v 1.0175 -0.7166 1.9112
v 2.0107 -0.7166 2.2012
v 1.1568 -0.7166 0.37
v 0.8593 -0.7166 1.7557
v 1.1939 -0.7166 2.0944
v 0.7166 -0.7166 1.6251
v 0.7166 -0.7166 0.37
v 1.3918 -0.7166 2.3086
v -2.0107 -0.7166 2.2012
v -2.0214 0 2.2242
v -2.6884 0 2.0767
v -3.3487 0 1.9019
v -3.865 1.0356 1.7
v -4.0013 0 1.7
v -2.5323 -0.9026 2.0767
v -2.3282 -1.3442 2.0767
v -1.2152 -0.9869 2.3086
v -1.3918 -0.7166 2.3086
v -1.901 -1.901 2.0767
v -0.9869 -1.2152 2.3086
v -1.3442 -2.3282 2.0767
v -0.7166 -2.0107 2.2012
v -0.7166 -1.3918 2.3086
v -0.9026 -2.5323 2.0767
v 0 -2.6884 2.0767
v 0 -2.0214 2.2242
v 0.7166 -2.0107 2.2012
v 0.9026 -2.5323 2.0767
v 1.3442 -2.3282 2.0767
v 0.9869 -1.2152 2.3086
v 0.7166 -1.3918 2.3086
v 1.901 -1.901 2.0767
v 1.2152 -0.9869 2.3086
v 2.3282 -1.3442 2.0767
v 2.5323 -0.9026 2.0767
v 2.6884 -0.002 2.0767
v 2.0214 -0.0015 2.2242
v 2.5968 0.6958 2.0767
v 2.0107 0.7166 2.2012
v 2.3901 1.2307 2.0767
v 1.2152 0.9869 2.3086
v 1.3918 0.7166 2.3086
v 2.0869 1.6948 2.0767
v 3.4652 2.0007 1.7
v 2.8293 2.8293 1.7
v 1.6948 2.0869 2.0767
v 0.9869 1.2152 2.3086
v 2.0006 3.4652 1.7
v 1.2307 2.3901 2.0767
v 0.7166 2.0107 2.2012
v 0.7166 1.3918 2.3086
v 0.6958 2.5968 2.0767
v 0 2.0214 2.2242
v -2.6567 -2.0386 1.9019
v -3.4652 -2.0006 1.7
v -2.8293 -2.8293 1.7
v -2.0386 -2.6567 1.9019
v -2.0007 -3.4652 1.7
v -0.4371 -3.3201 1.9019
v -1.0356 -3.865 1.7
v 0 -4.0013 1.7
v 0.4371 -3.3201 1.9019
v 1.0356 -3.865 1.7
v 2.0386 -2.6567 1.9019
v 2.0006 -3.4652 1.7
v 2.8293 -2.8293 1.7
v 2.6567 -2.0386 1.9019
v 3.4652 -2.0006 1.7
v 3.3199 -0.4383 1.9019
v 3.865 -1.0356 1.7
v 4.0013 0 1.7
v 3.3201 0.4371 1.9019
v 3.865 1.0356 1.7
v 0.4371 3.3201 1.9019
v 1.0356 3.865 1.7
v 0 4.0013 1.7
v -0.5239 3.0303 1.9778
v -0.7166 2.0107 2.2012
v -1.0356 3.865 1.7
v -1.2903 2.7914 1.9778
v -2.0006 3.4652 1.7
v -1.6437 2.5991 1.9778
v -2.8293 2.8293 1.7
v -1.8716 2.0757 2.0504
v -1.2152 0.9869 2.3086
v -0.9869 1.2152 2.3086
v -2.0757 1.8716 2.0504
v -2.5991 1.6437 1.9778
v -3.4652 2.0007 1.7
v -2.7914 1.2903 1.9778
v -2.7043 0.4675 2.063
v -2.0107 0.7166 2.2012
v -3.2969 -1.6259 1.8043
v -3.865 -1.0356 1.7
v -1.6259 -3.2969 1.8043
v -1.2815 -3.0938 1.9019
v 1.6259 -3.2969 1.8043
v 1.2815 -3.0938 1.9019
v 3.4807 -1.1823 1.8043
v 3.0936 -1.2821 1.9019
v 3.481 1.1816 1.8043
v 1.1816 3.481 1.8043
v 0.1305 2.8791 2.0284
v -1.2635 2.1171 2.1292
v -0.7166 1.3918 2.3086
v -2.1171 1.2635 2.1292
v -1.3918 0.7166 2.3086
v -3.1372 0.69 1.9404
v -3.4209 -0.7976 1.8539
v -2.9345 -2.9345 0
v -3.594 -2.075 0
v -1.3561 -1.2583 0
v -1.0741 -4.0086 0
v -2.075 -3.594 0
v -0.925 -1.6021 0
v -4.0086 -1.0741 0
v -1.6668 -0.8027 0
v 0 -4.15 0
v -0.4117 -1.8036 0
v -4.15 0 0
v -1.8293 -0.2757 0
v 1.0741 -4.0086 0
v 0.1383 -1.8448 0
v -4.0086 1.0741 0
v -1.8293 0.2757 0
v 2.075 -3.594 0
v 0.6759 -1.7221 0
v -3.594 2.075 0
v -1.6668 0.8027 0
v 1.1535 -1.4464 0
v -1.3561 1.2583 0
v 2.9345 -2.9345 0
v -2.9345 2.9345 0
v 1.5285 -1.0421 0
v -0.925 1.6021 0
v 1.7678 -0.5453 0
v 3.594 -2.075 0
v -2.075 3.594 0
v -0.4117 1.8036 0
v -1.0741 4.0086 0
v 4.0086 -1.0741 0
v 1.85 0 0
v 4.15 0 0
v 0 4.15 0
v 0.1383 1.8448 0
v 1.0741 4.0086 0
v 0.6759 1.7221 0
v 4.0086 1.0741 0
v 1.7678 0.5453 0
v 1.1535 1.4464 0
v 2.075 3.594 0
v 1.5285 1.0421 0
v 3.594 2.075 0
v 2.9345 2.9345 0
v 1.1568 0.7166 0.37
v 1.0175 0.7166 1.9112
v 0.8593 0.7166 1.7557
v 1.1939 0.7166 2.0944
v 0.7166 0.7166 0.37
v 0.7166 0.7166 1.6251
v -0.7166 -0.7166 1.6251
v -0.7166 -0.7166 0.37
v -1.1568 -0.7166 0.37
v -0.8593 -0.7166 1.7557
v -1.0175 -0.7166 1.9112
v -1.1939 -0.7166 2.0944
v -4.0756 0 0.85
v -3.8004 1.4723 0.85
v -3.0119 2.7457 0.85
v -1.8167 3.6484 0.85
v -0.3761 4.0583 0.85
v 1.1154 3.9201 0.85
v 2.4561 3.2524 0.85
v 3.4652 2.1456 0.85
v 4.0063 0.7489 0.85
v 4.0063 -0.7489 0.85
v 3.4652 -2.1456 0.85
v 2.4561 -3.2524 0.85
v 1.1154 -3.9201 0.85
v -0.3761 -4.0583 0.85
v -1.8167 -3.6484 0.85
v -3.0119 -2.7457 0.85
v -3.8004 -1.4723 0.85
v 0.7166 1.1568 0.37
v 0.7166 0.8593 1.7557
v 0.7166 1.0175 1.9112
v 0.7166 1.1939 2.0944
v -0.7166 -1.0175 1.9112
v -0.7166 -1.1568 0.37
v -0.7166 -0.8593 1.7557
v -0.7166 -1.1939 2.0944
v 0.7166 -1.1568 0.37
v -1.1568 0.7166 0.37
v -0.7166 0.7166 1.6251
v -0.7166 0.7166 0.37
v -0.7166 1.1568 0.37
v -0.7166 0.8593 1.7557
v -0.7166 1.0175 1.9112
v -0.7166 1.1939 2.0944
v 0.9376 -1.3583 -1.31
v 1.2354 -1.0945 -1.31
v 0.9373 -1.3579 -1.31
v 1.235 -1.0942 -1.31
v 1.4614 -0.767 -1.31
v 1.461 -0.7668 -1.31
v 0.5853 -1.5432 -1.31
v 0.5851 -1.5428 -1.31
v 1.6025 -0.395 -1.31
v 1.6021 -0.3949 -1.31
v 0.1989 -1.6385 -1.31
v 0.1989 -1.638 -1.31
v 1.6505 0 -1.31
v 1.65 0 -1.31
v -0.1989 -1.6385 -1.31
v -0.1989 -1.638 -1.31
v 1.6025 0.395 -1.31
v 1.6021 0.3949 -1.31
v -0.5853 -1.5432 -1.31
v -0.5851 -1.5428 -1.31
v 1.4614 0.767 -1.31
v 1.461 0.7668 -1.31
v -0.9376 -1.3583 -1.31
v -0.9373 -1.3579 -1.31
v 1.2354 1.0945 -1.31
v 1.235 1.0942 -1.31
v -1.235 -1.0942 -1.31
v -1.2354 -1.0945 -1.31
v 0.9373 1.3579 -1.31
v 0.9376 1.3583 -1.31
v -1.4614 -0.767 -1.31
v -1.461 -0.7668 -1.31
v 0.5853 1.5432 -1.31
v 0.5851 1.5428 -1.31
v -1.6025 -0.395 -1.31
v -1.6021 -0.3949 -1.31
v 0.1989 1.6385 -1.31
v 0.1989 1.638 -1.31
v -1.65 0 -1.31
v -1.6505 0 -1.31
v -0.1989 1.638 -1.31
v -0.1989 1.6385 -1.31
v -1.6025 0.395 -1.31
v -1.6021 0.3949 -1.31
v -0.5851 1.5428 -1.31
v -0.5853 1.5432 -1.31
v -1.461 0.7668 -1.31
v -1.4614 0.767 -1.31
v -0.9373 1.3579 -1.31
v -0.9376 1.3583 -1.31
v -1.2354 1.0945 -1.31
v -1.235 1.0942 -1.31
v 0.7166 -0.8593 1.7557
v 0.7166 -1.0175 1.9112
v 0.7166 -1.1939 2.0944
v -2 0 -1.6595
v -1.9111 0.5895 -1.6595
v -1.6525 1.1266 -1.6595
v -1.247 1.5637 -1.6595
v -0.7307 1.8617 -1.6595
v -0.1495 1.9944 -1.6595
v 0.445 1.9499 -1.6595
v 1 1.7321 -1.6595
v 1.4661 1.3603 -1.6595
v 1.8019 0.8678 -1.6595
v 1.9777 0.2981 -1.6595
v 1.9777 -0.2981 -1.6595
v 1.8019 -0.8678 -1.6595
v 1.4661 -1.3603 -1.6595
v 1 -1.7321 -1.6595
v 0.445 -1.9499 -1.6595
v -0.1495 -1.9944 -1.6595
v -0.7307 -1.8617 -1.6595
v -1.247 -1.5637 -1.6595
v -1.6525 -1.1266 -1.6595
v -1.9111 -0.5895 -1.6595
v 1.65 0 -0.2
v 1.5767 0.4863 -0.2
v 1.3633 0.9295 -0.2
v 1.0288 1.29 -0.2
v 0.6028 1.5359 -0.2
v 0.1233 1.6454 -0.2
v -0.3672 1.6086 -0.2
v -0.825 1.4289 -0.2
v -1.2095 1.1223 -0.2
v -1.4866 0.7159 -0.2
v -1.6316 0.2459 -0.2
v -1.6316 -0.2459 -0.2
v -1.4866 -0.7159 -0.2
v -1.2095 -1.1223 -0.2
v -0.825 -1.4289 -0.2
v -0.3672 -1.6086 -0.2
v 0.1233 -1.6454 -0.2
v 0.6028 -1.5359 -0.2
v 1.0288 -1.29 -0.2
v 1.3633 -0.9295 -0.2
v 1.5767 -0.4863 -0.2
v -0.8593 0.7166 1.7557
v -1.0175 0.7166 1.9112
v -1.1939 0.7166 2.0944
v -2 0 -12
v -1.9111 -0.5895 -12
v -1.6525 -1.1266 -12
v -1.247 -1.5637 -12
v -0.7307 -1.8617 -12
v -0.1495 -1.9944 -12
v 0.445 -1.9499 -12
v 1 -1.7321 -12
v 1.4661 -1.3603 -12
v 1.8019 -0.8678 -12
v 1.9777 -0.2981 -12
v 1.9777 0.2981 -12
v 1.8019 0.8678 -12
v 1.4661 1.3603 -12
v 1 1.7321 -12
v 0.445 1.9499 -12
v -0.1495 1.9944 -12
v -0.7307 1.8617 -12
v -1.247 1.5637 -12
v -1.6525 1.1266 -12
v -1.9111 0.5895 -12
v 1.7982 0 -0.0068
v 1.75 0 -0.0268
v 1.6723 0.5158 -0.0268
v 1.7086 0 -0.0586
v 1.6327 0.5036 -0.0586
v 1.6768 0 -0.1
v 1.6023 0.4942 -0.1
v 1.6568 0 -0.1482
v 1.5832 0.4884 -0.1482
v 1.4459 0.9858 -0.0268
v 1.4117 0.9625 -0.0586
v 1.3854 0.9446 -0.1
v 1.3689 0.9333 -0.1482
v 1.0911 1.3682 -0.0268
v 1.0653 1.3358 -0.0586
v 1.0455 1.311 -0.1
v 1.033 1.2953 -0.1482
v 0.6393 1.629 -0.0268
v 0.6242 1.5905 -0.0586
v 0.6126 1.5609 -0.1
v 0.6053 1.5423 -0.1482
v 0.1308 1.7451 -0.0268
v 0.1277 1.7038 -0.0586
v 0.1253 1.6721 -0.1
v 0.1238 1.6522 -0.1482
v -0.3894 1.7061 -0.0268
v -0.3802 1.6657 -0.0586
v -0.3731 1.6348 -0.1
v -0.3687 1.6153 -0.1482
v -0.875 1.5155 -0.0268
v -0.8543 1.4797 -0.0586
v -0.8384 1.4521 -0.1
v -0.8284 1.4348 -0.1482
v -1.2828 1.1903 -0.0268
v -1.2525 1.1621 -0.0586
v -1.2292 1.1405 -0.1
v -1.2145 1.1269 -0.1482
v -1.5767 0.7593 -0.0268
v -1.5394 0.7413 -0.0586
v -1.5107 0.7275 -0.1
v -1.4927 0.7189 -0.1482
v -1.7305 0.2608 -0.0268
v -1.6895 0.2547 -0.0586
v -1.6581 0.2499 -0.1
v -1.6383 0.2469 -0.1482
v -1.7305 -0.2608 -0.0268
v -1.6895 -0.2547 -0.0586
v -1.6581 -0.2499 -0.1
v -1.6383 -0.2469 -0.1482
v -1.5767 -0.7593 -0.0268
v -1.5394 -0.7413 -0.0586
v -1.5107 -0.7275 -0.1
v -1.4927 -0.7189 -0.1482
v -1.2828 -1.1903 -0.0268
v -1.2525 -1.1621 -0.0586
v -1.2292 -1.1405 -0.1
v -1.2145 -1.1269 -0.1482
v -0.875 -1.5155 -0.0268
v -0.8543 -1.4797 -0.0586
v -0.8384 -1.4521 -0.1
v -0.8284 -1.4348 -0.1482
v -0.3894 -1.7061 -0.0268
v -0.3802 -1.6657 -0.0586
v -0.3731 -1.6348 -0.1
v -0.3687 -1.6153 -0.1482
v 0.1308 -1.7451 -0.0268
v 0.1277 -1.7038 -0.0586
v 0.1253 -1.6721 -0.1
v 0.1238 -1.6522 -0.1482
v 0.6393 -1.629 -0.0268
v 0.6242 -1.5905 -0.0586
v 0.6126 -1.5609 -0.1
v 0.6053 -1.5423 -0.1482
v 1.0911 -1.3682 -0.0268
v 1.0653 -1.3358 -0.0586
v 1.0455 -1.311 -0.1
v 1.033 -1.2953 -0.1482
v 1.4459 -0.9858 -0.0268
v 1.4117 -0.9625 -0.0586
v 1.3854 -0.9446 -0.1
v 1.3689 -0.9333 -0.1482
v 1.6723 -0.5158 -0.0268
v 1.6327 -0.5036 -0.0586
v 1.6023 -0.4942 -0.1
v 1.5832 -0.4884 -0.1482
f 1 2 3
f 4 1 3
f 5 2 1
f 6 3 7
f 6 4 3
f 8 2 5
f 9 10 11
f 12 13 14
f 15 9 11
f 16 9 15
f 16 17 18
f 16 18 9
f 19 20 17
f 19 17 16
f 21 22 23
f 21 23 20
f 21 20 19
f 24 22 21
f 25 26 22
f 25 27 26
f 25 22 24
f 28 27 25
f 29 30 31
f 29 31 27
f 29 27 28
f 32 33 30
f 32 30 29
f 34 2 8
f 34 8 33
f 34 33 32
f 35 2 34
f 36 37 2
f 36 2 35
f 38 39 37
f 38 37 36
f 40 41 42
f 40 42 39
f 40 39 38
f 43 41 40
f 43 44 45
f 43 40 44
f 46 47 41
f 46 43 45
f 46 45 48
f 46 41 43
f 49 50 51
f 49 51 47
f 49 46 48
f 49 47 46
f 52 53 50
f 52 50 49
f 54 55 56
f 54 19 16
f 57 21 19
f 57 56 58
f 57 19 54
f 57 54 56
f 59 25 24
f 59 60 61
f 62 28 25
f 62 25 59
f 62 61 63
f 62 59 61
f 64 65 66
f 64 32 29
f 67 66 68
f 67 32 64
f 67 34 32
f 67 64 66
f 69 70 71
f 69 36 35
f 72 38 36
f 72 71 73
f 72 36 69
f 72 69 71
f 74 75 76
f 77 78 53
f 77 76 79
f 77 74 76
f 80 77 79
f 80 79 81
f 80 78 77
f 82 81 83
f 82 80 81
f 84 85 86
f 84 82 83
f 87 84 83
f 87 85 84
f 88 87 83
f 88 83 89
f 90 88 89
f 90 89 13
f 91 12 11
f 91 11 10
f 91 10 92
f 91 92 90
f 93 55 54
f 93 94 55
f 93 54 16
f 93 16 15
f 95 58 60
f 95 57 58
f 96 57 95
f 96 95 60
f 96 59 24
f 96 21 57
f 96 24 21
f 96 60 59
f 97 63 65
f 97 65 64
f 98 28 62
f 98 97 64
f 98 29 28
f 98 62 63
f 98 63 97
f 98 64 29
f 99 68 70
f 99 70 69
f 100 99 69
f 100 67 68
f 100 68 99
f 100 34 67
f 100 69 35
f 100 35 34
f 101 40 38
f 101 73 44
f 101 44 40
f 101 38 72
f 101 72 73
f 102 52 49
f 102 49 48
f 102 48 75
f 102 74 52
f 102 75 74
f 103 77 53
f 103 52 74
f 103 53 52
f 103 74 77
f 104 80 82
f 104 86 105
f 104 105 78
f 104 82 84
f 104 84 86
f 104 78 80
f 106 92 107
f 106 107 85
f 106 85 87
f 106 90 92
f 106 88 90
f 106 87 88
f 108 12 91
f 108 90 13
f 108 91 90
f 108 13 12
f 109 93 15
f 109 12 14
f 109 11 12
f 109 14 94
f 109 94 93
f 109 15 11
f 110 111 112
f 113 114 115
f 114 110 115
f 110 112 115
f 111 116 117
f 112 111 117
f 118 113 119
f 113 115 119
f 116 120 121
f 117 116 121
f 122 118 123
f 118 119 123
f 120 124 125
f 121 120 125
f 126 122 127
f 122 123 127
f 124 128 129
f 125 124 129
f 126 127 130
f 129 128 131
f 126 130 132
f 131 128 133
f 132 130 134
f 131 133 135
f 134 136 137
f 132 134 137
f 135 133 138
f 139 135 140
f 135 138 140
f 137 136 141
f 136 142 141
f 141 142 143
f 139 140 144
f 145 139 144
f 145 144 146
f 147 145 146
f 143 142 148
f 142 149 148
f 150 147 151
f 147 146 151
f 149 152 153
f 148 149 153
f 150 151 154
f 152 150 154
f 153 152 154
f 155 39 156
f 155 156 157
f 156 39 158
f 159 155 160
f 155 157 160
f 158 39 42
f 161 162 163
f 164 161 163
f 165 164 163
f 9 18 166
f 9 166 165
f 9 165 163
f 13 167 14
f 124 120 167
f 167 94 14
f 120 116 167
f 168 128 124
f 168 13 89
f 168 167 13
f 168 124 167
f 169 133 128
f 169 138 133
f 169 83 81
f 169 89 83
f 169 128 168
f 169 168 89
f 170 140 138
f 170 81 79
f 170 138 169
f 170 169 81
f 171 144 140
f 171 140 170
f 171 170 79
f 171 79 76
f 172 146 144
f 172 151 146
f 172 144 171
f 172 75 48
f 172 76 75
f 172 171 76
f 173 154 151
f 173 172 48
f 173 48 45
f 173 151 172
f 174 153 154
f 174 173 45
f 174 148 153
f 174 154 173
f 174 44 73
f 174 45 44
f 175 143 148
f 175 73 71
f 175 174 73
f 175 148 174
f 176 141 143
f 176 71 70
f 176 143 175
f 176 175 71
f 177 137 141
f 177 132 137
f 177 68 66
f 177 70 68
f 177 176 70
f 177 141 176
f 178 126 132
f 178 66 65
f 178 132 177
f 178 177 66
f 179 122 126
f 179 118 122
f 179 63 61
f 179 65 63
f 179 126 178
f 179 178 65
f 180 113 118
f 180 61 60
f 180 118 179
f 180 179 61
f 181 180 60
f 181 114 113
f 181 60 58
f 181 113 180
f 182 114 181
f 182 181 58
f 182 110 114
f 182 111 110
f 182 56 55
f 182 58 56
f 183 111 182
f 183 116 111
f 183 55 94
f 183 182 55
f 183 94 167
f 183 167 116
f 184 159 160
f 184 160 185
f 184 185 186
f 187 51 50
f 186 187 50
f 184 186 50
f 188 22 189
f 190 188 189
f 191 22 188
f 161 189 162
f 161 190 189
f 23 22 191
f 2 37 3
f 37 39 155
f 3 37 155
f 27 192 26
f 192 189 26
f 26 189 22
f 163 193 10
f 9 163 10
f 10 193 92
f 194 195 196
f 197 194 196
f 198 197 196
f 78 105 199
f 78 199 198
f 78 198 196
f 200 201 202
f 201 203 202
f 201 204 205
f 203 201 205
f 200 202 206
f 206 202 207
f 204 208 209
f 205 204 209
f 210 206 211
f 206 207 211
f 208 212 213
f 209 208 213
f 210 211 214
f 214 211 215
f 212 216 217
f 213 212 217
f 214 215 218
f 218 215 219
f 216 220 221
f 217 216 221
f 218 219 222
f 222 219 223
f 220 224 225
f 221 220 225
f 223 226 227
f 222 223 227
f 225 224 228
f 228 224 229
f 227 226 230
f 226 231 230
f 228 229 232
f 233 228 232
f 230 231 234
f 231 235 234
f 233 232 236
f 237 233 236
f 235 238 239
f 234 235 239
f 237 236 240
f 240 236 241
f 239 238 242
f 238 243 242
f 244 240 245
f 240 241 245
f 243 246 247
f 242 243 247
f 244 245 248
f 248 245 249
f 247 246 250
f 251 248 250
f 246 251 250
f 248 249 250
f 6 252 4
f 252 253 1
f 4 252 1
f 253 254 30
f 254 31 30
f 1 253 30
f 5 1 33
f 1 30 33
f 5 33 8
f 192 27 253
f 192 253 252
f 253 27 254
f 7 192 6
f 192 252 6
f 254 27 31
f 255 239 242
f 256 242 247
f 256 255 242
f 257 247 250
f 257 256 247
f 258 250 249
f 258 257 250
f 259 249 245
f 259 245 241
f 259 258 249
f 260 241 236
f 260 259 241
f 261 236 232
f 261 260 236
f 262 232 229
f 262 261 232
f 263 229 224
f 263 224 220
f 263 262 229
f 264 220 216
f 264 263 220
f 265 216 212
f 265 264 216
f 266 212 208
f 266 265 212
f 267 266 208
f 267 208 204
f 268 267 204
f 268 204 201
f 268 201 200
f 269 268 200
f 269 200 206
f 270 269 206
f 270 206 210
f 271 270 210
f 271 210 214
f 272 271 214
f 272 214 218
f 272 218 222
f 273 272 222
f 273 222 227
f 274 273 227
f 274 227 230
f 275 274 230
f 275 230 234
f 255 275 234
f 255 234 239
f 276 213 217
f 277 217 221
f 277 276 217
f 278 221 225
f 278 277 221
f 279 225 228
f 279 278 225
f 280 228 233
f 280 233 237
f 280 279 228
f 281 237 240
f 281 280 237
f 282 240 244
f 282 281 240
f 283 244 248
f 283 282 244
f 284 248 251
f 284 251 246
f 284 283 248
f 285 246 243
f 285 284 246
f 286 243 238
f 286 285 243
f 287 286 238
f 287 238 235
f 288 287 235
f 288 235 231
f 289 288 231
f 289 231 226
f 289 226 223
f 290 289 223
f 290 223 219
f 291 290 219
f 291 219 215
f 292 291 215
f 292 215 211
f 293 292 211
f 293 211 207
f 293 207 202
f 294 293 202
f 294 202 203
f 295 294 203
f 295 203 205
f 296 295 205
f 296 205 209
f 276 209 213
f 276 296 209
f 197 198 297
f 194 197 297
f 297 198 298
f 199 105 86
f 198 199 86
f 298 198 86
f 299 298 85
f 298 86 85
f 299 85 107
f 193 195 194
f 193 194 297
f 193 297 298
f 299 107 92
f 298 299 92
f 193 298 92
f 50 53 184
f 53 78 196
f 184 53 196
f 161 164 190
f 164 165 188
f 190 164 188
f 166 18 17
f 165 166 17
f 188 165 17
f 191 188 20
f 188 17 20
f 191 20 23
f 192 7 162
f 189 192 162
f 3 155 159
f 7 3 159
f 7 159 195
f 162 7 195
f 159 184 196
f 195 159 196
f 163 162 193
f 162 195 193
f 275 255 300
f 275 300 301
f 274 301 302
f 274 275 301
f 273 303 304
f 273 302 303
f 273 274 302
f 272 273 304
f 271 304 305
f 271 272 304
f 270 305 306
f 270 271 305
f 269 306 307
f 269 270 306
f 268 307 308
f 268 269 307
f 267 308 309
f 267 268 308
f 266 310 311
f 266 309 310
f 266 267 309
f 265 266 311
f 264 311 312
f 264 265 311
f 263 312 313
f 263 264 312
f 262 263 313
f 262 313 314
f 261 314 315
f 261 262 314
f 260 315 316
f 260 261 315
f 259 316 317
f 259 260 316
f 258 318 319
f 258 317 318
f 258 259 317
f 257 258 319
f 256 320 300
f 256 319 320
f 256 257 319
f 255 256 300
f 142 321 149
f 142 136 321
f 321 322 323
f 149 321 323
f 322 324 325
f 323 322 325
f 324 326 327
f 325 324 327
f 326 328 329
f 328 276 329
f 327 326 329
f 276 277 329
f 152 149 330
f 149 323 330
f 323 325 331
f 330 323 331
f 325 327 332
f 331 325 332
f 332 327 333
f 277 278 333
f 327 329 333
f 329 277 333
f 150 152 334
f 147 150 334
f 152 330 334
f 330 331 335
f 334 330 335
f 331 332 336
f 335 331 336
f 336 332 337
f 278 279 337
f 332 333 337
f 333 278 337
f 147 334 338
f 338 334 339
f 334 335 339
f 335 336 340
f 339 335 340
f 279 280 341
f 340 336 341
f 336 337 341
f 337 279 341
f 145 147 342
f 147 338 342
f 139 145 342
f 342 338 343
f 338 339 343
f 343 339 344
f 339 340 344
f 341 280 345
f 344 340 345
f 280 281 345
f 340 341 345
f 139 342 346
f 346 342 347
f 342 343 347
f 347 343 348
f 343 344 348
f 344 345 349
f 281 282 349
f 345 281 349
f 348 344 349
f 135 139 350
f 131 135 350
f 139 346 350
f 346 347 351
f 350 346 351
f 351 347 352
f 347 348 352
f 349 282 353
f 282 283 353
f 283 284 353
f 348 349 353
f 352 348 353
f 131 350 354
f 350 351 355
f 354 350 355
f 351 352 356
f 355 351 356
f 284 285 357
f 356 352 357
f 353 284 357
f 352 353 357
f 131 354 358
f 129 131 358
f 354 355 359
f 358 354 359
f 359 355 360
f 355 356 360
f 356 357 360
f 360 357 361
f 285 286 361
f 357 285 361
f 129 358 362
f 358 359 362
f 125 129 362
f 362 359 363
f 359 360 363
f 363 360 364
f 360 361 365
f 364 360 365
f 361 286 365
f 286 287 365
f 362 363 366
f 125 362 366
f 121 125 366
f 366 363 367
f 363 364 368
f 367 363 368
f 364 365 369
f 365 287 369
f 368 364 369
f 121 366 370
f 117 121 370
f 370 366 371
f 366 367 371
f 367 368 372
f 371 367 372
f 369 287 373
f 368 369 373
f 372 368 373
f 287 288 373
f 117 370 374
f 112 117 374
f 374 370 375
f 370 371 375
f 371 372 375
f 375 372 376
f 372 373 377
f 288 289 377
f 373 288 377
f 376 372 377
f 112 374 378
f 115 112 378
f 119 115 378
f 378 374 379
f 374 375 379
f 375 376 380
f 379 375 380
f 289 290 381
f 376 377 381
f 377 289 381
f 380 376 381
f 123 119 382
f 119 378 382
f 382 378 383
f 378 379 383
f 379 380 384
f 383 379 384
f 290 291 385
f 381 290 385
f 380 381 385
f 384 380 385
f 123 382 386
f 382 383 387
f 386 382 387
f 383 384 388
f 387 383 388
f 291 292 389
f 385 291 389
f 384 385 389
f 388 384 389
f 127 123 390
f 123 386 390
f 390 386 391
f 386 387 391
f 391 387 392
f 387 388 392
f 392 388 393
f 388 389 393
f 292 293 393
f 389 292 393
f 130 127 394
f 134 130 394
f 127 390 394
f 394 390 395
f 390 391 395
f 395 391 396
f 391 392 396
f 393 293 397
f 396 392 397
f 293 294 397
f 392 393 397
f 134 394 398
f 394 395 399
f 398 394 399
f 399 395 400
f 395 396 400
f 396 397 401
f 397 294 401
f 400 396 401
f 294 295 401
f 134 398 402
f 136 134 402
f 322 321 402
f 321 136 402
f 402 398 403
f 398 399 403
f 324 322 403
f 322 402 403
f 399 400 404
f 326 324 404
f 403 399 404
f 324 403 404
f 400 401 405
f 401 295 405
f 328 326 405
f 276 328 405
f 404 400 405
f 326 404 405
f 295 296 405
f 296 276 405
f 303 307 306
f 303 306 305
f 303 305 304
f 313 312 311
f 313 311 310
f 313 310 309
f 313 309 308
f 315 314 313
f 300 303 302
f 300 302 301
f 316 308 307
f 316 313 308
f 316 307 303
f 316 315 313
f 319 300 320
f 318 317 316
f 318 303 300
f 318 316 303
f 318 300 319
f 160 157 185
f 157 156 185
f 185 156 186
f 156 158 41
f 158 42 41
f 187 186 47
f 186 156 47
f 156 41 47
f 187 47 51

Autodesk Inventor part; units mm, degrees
ref_plane "YZ Plane" through (0, 0, 0) normal (1, 0, 0) x (0, 1, 0)
sketch "Sketch2" plane through (0, 0, 0) normal (0, 0, 1) x (1, 0, 0)
  circle A0 centre (0, 0) radius 1.65
  dimension "d3" = 3.3
extrude "Extrusion1" add sketch "Sketch2" against normal blind 1.31
sketch "Sketch3" plane through (0, 0, -1.31) normal (0, 0, -1) x (-1, 0, 0)
  circle A0 centre (0, 0) radius 2
  circle A1 centre (0, 0) radius 1.65 construction
  dimension "d28" = 360
  dimension "d9" = 4
extrude "Extrusion2" add sketch "Sketch3" along normal blind 10.69
chamfer "Chamfer1" distance 0.35 distance2 0.35 1 edges at (2, 0, -1.31) measured on face at (-1.848, -0.2912, -1.31)
sketch "Sketch4" plane through (0, 0, 0) normal (0, 0, 1) x (1, 0, 0)
  circle A0 centre (0, 0) radius 4.15
  circle A1 centre (0, 0) radius 1.65 construction
  dimension "d15" = 8.3
extrude "Extrusion3" add sketch "Sketch4" along normal blind 1.7
fillet "Fillet1" radius 0.2 1 edges at (-1.65, 0, 0)
sketch "Sketch5" plane through (0, 0, 0) normal (0, 1, 0) x (-1, 0, 0)
  line L0 (4.15, 1.7) -> (4.15, 0)
  line L1 (4.0013, 1.7) -> (4.15, 1.7)
  line L2 (4.15, 0) -> (4.0013, 1.7)
  line L3 (-4.15, 1.7) -> (4.15, 1.7) construction
  line L4 (-4.15, 0) -> (4.15, 0) construction
  line L5 (0, -0.34) -> (0, 2.04) projected
  line L6 (5.81, 0) -> (-5.81, 0) projected
  dimension "d20" = 5
  dimension "d56" = 4.15
  dimension "d57" = 1.7
revolve "Revolution1" cut sketch "Sketch5" angle 360 about axis through (0, 0, -10) along (0, 0, 1)
sketch "Sketch6" plane through (0, 0, 0) normal (0, 1, 0) x (-1, 0, 0)
  line L0 (0, 2.5) -> (0, 1.7)
  arc A0 (4.0013, 1.7) -> (0, 2.5) centre (-1.2292, -14.0544) ccw
  line L1 (0, 1.7) -> (4.0013, 1.7)
  line L2 (4.0013, 1.7) -> (-4.0013, 1.7) construction
  line L3 (0, -4.4495) -> (0, 0.4495)
  line L4 (0, -17.39) -> (0, 5.959) projected
  line L5 (5.6314, 0) -> (-5.6067, 0) projected
  dimension "d58" = 0.8
  dimension "d59" = 4.0013
  dimension "d60" = 0
  dimension "d62" = 16.6
revolve "Revolution2" add sketch "Sketch6" angle 360 about axis through (0, 0, -4.4495) along (0, 0, 1)
sketch "Sketch7" plane through (0, 0, 0) normal (0, 1, 0) x (-1, 0, 0)
  line L0 (2.15, 2.5) -> (-2.15, 2.5)
  line L1 (1.1568, 0.37) -> (2.15, 2.5)
  line L2 (-1.1568, 0.37) -> (1.1568, 0.37)
  line L3 (-2.15, 2.5) -> (-1.1568, 0.37)
  line L4 (0, -0.056) -> (0, 2.926) projected
  line L5 (3.01, 0) -> (-3.01, 0) projected
  dimension "d32" = 2.13
  dimension "d34" = 65
  dimension "d36" = 65
  dimension "d63" = 2.15
  dimension "d64" = 2.5
  dimension "d65" = 4.3
extrude "Extrusion4" cut sketch "Sketch7" against normal mid plane 1.4333
sketch "Sketch8" plane through (0, 0, 0) normal (1, 0, 0) x (0, 1, 0)
  line L0 (-1.1568, 0.37) -> (-2.15, 2.5)
  line L1 (1.1568, 0.37) -> (-1.1568, 0.37)
  line L2 (2.15, 2.5) -> (1.1568, 0.37)
  line L3 (-2.15, 2.5) -> (2.15, 2.5)
  line L4 (0, -0.056) -> (0, 2.926) projected
  line L5 (-3.01, 0) -> (3.01, 0) projected
  dimension "d40" = 65
  dimension "d42" = 65
  dimension "d44" = 2.13
  dimension "d66" = 4.3
  dimension "d67" = 2.5
  dimension "d69" = 2.15
extrude "Extrusion5" cut sketch "Sketch8" along normal mid plane 1.4333
sketch "Sketch9" plane through (0, 0, 0) normal (0, 1, 0) x (-1, 0, 0)
  line L0 (0, 2.5) -> (0, 0.37)
  line L1 (1.72, 2.5) -> (0, 2.5)
  line L2 (0, 0.37) -> (1.72, 2.5)
  line L3 (-4.15, 0) -> (4.15, 0) construction
  line L4 (0, -0.5) -> (0, 3) projected
  line L5 (5.81, 0) -> (-5.81, 0) projected
  dimension "d50" = 2.13
  dimension "d52" = 2.13
  dimension "d54" = 1.72
  dimension "d70" = 0
  dimension "d71" = 2.5
revolve "Revolution3" cut sketch "Sketch9" angle 360 about axis through (0, 0, -10) along (0, 0, 1)
thread "Thread1" size "M4x0.7" class "6g" standard "ISO Metric profile" full length
ref_plane "MSC_PF1" through (0, 0, 0) normal (1, 0, 0) x (0, 1, 0)
ref_plane "MSC_PT1" through (0, 0, 0) normal (0, 0, -1) x (-1, 0, 0)
equation "\"d12\" = -0.5 * msp_ds + 0.5 * NND"
equation "\"d13\" = 0.5 * NND - 0.5 * msp_ds"
equation "\"d18\" = r"
equation "\"d4\" = -b + NLG"
equation "\"d9\" = NND"
equation "\"d10\" = b"
equation "\"d15\" = Dk"
equation "\"d16\" = ParK"
equation "\"d32\" = q"
equation "\"d63\" = 0.5 * M"
equation "\"d64\" = ParK + ParF"
equation "\"d65\" = M"
equation "\"d37\" = 2 * msp_s"
equation "\"d44\" = q"
equation "\"d66\" = M"
equation "\"d67\" = ParK + ParF"
equation "\"d69\" = 0.5 * M"
equation "\"d47\" = 2 * msp_s"
equation "\"d3\" = msp_ds"
equation "\"d56\" = 0.5 * Dk"
equation "\"d57\" = ParK"
equation "\"d58\" = ParF"
equation "\"d59\" = 0.5 * Dk - msp_v"
equation "\"d62\" = 2 * Dk"
equation "\"d50\" = q"
equation "\"d52\" = q"
equation "\"d54\" = msp_rr"
equation "\"d71\" = ParK + ParF"
equation "\"PTC\" = 0.7"
equation "\"NLG\" = 12"
equation "\"Dk\" = 8.3"
equation "\"ParK\" = 1.7"
equation "\"NND\" = 4"
equation "\"M\" = 4.3"
equation "\"q\" = 2.13"
equation "\"r\" = 0.2"
equation "\"msp_ds\" = NND - PTC"
equation "\"b\" = 10.69"
equation "\"msp_x\" = 1.25 * PTC"
equation "\"msp_s\" = 0.166667 * M"
equation "\"msp_rr\" = 0.4 * M"
equation "\"ParF\" = 0.8"
equation "\"msp_v\" = 0.0874887 * ParK"
equation "\"THREADDIA\" = NND"
properties part number "JIS B 1111 - M4x12" material "Steel, Mild"
